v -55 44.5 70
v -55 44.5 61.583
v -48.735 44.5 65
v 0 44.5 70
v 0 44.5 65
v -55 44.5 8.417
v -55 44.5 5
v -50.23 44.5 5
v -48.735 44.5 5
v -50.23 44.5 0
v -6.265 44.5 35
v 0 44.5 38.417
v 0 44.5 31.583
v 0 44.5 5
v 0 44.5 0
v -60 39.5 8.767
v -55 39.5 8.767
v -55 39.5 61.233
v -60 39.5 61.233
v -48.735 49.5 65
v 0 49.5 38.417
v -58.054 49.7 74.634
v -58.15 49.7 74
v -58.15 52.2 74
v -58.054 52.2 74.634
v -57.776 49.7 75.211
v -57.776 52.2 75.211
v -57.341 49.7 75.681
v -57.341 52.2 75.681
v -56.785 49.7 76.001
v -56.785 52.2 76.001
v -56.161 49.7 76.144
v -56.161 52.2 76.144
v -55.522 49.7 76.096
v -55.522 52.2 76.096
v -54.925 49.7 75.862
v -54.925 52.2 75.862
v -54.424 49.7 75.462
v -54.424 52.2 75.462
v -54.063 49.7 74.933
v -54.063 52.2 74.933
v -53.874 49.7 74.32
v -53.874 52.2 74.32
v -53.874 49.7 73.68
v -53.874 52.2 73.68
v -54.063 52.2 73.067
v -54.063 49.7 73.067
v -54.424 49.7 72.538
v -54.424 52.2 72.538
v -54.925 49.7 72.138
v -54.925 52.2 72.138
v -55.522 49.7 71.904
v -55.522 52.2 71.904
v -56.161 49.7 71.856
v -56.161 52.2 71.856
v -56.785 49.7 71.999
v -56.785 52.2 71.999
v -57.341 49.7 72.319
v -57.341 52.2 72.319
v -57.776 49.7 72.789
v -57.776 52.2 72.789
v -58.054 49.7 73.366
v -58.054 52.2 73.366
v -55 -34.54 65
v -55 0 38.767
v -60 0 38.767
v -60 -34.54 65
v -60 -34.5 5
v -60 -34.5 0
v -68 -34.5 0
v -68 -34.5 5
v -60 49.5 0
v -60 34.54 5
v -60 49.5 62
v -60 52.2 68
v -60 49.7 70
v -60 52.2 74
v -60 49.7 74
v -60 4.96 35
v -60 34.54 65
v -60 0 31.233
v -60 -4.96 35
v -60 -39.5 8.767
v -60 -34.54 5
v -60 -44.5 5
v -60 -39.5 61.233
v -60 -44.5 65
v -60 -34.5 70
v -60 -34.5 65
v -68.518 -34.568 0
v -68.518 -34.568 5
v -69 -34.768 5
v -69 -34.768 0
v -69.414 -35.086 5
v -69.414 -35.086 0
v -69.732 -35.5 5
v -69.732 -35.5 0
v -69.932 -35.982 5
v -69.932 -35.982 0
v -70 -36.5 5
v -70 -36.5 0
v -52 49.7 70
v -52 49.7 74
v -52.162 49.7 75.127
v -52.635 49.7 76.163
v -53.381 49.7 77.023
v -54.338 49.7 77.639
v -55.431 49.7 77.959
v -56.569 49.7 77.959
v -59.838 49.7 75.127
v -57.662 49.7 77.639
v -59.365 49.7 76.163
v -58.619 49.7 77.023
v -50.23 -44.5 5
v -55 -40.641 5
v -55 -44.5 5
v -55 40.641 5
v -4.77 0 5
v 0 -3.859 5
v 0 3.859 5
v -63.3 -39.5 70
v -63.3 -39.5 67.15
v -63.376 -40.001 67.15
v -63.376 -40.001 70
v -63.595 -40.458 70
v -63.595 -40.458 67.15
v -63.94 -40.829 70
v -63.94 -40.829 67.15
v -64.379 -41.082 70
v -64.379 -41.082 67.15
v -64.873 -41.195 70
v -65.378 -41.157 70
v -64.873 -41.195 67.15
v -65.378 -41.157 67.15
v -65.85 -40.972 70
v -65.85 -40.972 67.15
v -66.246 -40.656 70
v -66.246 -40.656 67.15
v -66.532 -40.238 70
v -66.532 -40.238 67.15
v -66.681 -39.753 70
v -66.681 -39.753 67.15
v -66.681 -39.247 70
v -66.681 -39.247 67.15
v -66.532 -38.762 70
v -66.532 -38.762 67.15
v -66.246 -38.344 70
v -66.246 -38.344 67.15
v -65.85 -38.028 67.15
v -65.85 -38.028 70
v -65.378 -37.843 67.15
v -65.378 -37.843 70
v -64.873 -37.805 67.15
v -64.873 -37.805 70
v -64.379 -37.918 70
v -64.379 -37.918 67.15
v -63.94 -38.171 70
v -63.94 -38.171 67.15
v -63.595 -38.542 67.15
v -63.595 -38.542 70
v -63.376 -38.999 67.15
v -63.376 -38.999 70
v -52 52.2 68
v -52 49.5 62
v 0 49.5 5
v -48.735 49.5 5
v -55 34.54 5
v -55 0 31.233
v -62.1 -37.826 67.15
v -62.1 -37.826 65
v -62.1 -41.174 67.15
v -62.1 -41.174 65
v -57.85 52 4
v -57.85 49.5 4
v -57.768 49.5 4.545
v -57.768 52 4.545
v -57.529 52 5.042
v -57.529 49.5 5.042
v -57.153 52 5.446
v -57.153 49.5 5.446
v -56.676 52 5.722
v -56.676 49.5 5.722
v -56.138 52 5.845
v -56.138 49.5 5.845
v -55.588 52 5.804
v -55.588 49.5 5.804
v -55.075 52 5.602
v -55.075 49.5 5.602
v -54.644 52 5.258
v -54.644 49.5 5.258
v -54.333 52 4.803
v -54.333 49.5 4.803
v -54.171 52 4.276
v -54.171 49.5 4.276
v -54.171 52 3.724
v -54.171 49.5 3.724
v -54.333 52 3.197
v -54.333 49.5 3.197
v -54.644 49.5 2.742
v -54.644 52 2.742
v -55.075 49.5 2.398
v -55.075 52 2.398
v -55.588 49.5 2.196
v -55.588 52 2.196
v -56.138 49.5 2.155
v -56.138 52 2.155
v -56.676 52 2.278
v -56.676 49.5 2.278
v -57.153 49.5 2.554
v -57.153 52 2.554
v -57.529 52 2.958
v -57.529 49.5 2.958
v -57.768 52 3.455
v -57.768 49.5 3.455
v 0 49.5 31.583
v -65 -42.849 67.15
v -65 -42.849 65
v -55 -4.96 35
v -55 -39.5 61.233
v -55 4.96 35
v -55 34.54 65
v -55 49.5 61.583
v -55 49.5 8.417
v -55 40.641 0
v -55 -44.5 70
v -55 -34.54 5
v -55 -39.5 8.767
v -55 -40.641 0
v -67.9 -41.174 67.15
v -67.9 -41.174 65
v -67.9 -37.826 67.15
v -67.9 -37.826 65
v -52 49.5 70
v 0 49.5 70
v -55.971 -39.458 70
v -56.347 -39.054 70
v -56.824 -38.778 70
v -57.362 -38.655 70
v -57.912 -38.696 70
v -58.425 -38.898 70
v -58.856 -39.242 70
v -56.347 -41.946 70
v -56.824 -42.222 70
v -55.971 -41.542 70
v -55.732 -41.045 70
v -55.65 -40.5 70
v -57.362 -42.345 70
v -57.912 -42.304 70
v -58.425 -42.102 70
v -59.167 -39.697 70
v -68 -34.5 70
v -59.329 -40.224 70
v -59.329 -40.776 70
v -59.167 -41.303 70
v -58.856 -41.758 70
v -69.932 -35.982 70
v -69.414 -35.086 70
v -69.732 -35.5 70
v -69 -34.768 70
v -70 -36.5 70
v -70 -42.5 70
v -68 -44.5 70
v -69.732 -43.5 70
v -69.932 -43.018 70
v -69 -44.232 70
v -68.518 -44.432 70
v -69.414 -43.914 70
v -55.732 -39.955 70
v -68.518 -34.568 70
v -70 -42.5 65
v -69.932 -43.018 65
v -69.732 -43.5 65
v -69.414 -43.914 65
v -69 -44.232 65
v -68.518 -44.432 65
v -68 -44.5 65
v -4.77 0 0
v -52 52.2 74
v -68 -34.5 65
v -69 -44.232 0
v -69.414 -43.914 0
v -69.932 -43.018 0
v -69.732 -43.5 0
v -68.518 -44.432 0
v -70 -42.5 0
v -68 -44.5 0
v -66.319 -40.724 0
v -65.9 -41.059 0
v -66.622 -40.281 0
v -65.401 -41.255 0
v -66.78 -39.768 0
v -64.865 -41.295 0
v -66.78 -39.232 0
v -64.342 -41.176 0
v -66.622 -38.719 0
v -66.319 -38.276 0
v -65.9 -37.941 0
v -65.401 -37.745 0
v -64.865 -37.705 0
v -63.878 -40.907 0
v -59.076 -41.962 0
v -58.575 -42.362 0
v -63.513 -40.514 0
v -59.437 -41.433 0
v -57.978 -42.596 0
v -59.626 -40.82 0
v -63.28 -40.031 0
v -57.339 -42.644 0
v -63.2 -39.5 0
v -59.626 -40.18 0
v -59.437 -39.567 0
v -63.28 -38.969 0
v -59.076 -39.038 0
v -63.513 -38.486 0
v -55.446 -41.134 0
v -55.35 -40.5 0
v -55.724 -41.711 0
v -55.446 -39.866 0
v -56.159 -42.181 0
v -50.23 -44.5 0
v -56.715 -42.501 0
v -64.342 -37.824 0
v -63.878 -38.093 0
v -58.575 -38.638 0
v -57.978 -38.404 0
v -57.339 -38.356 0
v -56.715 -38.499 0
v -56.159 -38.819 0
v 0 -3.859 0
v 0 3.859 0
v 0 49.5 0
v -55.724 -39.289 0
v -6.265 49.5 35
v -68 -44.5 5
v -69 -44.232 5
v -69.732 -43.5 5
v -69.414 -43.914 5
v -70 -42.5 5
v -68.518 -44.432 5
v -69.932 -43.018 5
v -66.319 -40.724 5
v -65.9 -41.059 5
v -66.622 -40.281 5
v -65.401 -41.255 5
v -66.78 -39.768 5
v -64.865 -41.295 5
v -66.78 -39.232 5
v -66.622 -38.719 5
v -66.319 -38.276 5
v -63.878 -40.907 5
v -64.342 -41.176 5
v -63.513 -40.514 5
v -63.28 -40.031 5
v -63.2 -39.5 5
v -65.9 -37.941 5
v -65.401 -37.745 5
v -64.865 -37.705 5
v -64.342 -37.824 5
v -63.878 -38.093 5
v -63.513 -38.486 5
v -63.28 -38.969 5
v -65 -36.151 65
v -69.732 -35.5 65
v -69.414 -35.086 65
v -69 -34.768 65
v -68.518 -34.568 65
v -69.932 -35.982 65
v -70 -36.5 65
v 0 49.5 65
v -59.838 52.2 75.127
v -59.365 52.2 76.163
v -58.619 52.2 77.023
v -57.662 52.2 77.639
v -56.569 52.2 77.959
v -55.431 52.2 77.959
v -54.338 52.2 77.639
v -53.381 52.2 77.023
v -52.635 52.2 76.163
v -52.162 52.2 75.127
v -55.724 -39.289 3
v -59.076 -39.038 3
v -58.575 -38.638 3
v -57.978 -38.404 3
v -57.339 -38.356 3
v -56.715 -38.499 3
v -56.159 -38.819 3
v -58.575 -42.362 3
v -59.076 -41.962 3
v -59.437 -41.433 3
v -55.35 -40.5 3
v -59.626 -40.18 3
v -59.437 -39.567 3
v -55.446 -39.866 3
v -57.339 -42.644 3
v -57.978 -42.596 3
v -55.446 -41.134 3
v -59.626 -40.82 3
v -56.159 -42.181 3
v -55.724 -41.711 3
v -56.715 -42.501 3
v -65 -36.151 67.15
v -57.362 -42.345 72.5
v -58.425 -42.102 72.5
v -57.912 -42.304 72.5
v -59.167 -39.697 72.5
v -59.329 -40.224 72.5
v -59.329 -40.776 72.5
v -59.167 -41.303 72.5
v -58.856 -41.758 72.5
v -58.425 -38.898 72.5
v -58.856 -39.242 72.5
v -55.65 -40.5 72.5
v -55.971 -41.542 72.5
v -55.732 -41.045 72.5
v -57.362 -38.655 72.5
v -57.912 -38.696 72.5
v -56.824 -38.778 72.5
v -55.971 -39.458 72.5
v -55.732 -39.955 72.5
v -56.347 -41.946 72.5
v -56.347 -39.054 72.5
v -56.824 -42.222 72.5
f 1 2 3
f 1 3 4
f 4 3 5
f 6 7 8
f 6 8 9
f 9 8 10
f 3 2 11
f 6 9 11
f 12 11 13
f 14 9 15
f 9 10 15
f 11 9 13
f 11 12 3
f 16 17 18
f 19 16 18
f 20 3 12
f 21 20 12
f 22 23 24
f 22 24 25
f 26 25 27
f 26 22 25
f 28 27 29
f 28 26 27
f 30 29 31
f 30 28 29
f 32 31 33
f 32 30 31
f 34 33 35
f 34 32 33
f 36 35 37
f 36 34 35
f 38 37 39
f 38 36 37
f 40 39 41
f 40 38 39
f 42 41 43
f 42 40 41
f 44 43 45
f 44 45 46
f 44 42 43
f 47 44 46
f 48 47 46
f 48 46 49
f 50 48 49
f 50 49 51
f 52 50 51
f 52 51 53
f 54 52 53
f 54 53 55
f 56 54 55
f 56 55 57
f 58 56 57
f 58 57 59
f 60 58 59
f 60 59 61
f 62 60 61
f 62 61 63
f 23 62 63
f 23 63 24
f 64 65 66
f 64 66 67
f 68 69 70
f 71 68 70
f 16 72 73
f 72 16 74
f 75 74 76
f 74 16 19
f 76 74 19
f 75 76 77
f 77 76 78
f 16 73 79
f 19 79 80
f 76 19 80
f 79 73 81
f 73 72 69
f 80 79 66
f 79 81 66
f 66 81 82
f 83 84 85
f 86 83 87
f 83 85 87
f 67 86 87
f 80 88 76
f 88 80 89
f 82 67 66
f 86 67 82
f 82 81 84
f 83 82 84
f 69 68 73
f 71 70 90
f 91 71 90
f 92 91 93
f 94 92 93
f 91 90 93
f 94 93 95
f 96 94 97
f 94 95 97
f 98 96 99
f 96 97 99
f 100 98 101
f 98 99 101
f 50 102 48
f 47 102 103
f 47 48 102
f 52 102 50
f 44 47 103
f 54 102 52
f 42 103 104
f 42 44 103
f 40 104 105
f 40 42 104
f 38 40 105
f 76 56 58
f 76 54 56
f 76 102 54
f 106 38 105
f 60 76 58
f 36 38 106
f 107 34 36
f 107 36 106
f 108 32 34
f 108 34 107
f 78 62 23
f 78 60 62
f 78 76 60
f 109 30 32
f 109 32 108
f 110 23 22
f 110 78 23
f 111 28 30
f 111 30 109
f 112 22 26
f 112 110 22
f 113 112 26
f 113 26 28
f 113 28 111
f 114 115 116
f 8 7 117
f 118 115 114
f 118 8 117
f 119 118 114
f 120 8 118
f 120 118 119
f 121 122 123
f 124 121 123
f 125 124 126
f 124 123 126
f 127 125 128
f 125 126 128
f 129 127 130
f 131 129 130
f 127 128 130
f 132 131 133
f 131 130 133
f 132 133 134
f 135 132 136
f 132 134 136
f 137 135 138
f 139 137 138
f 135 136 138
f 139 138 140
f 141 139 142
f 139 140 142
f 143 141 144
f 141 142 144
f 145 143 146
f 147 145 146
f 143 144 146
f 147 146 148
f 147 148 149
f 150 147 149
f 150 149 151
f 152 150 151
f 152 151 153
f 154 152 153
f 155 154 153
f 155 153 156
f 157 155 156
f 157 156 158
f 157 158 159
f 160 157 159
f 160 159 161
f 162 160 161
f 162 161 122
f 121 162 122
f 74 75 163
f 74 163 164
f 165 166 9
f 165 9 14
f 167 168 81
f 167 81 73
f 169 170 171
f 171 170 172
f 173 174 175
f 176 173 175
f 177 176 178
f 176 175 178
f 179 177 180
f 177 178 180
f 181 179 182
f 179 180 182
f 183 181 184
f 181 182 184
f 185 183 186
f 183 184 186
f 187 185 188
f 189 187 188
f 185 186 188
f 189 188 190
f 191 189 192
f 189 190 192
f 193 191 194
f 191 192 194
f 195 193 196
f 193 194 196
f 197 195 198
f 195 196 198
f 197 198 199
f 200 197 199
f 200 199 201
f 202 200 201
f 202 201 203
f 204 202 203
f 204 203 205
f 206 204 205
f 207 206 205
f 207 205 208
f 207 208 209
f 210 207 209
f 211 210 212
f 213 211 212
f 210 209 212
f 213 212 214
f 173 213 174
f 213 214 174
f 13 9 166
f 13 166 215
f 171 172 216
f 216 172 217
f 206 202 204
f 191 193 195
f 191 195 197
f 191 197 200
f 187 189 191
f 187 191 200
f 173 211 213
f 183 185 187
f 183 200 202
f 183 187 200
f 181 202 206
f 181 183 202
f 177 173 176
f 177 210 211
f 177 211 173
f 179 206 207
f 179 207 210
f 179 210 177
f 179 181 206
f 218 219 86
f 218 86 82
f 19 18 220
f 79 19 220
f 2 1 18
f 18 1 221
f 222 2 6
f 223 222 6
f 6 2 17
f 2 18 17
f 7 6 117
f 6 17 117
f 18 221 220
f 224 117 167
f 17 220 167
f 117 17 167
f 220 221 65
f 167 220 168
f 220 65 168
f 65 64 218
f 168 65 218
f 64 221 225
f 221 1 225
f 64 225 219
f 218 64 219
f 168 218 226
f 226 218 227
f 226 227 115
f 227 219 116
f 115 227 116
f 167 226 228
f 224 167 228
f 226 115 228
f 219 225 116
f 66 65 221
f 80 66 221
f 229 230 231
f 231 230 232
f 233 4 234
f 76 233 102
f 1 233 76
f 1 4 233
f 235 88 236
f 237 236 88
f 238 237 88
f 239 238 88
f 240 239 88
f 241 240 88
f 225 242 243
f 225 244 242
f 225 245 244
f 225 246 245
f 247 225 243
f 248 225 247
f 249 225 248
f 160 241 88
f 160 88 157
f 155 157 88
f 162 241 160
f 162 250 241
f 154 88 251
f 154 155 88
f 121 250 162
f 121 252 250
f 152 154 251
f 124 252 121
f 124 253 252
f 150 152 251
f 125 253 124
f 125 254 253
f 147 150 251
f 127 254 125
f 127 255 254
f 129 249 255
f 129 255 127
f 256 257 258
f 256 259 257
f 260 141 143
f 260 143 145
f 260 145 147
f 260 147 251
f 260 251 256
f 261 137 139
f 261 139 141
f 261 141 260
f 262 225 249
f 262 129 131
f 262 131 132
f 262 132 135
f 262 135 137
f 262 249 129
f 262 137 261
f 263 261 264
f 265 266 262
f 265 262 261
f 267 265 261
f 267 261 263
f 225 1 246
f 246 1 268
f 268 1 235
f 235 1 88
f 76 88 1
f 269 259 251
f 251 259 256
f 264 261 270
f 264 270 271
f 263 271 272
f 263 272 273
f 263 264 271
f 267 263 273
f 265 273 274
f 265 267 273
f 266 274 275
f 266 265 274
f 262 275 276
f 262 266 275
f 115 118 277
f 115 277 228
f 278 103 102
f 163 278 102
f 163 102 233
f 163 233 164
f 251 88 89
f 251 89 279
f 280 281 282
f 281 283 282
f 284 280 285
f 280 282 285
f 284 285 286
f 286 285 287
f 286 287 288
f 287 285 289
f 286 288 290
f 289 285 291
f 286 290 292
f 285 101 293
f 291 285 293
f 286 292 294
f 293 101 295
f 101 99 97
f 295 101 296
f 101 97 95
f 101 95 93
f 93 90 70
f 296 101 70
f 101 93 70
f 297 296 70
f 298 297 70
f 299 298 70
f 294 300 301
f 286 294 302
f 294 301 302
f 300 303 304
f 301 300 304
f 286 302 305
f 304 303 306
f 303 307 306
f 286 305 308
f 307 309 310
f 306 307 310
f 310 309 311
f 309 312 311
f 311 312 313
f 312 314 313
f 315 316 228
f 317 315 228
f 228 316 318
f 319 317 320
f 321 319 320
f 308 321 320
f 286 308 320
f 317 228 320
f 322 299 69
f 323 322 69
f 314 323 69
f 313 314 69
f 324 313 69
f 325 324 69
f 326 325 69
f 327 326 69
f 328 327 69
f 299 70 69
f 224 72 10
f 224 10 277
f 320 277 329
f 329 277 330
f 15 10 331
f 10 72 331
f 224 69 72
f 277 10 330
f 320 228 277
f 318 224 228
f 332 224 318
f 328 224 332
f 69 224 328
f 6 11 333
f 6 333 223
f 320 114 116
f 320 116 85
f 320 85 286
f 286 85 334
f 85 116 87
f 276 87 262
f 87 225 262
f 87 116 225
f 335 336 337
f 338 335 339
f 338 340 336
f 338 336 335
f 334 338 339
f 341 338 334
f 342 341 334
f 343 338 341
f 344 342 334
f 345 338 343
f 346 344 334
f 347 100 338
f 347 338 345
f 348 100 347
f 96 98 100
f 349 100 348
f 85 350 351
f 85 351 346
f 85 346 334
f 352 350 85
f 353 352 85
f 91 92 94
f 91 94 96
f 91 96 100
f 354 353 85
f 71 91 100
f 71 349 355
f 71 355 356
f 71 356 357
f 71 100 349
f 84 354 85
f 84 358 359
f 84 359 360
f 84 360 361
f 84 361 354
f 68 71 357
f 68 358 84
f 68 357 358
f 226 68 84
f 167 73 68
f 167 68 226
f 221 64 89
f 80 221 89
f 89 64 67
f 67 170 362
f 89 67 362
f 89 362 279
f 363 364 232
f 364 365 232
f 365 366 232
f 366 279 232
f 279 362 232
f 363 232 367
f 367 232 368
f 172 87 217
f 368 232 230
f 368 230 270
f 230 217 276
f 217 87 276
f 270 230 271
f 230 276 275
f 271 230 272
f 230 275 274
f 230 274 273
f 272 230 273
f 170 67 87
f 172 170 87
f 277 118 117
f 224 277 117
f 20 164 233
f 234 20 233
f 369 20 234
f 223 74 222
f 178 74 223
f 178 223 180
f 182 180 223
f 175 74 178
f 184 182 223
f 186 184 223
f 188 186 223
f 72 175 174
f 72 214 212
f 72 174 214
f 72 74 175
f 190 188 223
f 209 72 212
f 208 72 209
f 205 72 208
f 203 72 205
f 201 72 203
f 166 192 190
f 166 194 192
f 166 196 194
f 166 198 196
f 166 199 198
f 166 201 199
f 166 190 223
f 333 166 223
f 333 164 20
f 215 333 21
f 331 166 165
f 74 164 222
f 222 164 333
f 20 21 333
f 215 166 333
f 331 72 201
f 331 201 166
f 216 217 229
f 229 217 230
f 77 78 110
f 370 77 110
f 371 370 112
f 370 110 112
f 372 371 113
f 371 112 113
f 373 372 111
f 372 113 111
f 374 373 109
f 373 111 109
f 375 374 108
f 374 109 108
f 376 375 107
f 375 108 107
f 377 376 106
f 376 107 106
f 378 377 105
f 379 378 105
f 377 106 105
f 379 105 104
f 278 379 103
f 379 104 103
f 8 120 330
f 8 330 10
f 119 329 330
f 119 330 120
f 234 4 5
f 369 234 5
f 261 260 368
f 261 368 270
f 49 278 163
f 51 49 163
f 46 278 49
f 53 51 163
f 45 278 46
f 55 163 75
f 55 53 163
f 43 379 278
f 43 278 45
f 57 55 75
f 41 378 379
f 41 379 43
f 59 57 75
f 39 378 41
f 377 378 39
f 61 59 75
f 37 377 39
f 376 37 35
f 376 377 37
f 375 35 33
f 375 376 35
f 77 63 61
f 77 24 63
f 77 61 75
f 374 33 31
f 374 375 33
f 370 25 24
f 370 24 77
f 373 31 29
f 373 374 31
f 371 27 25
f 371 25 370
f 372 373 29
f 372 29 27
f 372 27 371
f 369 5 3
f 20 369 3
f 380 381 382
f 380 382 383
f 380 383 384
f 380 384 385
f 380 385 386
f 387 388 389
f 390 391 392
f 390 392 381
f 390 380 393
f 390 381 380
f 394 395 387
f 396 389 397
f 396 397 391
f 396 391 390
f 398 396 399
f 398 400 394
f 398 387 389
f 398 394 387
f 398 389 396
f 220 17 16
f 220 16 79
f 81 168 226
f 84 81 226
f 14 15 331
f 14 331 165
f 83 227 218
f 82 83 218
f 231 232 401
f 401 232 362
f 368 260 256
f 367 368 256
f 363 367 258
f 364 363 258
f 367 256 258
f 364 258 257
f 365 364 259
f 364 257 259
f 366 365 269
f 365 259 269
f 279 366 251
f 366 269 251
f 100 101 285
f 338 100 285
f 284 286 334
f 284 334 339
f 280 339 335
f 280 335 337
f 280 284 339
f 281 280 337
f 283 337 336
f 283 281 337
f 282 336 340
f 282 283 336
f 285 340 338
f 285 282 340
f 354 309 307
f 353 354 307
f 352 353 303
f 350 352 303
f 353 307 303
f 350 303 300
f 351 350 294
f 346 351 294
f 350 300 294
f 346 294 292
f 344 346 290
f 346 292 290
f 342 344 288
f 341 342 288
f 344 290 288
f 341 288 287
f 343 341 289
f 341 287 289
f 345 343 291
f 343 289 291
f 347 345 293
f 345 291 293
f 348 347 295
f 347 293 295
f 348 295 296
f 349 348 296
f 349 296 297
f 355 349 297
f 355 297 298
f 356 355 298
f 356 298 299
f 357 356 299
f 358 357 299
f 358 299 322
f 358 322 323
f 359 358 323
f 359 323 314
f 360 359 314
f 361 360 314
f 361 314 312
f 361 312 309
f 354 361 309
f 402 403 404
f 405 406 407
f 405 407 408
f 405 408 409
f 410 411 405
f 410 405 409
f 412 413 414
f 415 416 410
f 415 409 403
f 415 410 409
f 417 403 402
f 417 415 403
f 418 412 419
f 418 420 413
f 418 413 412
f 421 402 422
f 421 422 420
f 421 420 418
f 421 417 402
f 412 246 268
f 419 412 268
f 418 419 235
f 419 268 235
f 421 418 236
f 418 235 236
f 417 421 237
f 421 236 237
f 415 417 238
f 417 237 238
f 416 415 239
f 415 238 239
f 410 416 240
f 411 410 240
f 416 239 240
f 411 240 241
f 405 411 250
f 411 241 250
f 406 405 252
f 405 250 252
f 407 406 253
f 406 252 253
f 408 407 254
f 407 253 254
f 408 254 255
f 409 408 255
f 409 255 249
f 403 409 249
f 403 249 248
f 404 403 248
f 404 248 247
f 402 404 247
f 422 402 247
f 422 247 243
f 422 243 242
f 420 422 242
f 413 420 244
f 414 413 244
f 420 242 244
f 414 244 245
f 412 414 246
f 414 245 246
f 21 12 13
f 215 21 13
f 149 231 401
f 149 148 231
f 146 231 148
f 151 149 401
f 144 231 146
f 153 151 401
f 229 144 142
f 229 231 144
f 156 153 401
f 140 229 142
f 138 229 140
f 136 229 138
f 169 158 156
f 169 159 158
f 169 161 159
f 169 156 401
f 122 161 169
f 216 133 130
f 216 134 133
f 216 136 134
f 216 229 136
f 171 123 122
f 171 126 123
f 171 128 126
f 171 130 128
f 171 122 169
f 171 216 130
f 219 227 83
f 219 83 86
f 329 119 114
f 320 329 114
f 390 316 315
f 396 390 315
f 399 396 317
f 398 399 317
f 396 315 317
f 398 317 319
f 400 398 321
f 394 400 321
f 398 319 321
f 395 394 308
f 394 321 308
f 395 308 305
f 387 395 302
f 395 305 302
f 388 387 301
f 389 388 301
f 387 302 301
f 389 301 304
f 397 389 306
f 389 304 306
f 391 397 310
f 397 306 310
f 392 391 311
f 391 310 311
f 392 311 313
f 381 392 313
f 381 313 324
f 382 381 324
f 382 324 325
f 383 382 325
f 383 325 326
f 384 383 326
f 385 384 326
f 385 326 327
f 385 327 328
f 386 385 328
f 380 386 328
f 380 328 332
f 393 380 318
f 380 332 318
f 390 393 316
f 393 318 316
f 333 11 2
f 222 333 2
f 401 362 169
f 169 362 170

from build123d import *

# Parameters (mm, degrees)
SKETCH_W                   = 55
SKETCH_H                   = 44.5
PAD_DEPTH                  = 5
PAD001_DEPTH               = 5
PAD001_MIRRORED001_2_DEPTH = 5
PAD002_DEPTH               = 5
SKETCH003_R                = 1.85
PAD003_DEPTH               = 2.5
SKETCH004_R                = 2.15
PAD004_DEPTH               = 2.7
SKETCH005_W                = 0.2
SKETCH005_H                = 8
POCKET_DEPTH               = 60.001
SKETCH006_R                = 1.85
PAD005_DEPTH               = 2.5
SKETCH007_R                = 2.15
POCKET001_DEPTH            = 3
PAD006_DEPTH               = 5
SKETCH009_R                = 1.8
HOLE_DEPTH                 = 25
HOLE_TIPS_R                = 1.8
PAD007_DEPTH               = 5
POCKET002_DEPTH            = 2.15
SKETCH012_R                = 1.7
HOLE001_DEPTH              = 10.851
POCKET003_DEPTH            = 290.201912


with BuildPart() as part:
    # Sketch → Pad (new body)
    with BuildSketch(Plane.XY):
        with Locations((-27.5, -22.25)):
            Rectangle(SKETCH_W, SKETCH_H)
    pad = extrude(amount=PAD_DEPTH)

    # Mirrored: Pad across XZ
    add(pad.mirror(Plane.XZ))

    # Sketch001 (on Face1 of Mirrored) → Pad001 (join)
    with BuildSketch(Plane(origin=(-55, 0, 0), x_dir=(0, -1, 0), z_dir=(-1, 0, 0))):
        Polygon((0, 0), (44.5, 0), (44.5, 35), (39.5, 35), (39.5, 8.767158), (4.960091, 35), (0, 35), (0, 31.232842), (34.539909, 5), (0, 5), align=None)
    pad001 = extrude(amount=PAD001_DEPTH)

    # Sketch001 Mirrored001 2 → Pad001 Mirrored001 2 (add)
    with BuildSketch(Plane.YZ.offset(-55)):
        Polygon((0, 0), (44.5, 0), (44.5, 35), (39.5, 35), (39.5, 8.767158), (4.960091, 35), (0, 35), (0, 31.232842), (34.539909, 5), (0, 5), align=None)
    pad001_mirrored001_2 = extrude(amount=-PAD001_MIRRORED001_2_DEPTH)

    # Mirrored002: Pad001, Pad001 Mirrored001 2 across face of Pad001
    add(pad001.mirror(Plane(origin=(-57.5, -2.480045, 35), x_dir=(1, 0, 0), z_dir=(0, 0, 1))))
    add(pad001_mirrored001_2.mirror(Plane(origin=(-57.5, -2.480045, 35), x_dir=(1, 0, 0), z_dir=(0, 0, 1))))

    # Sketch002 (on Face1 of MultiTransform) → Pad002 (join)
    with BuildSketch(Plane(origin=(0, 44.5, 0), x_dir=(-1, 0, 0), z_dir=(0, 1, 0))):
        Polygon((6.264982, 35), (55, 8.417263), (55, 35), (60, 35), (60, 0), (0, 0), (0, 5), (48.735018, 5), (0, 31.582737), (0, 35), align=None)
    pad002 = extrude(amount=PAD002_DEPTH)

    # Mirrored003: Pad002 across face of Pad002
    add(pad002.mirror(Plane(origin=(-3.132491, 47, 35), x_dir=(1, 0, 0), z_dir=(0, 0, 1))))

    # Sketch003 (on Face8 of Mirrored003) → Pad003 (join)
    with BuildSketch(Plane(origin=(0, 49.5, 0), x_dir=(-1, 0, 0), z_dir=(0, 1, 0))):
        with Locations((56, 4)):
            Circle(SKETCH003_R)
    extrude(amount=PAD003_DEPTH)

    # Sketch004 (on Face19 of Pad003) → Pad004 (join)
    with BuildSketch(Plane(origin=(0, 49.5, 0), x_dir=(-1, 0, 0), z_dir=(0, 1, 0))):
        with BuildLine():
            Line((60, 62), (60, 74))
            ThreePointArc((60, 74), (56, 78), (52, 74))
            Line((52, 74), (52, 62))
            Line((52, 62), (60, 62))
        make_face()
        with Locations((56, 74)):
            Circle(SKETCH004_R, mode=Mode.SUBTRACT)
    extrude(amount=PAD004_DEPTH)

    # Sketch005 (on Face56 of Pad004) → Pocket (cut, through all)
    with BuildSketch(Plane(origin=(-60, 0, 0), x_dir=(0, -1, 0), z_dir=(-1, 0, 0))):
        Polygon((-52.2, 68), (-49.5, 62), (-52.2, 62), align=None)
        with Locations((-49.6, 74)):
            Rectangle(SKETCH005_W, SKETCH005_H)
    extrude(amount=-POCKET_DEPTH, mode=Mode.SUBTRACT)

    # Sketch006 (on Face59 of Pocket) → Pad005 (join)
    with BuildSketch(Plane.XY.offset(70)):
        with Locations((-57.5, -40.5)):
            Circle(SKETCH006_R)
    extrude(amount=PAD005_DEPTH)

    # Sketch007 (on Face24 of Pad005) → Pocket001 (cut)
    with BuildSketch(Plane(origin=(0, 0, 0), x_dir=(1, 0, 0), z_dir=(0, 0, -1))):
        with Locations((-57.5, 40.5)):
            Circle(SKETCH007_R)
    extrude(amount=-POCKET001_DEPTH, mode=Mode.SUBTRACT)

    # Sketch008 (on Face24 of Pocket001) → Pad006 (join)
    with BuildSketch(Plane(origin=(0, 0, 0), x_dir=(1, 0, 0), z_dir=(0, 0, -1))):
        with BuildLine():
            Line((-60, 44.5), (-68, 44.5))
            ThreePointArc((-68, 44.5), (-69.414214, 43.914214), (-70, 42.5))
            Line((-70, 42.5), (-70, 39.5))
            Line((-70, 39.5), (-60, 39.5))
            Line((-60, 39.5), (-60, 44.5))
        make_face()
    pad006 = extrude(amount=-PAD006_DEPTH)

    # Mirrored004: Pad006 across face of Pad006
    add(pad006.mirror(Plane(origin=(-65, -39.5, 2.5), x_dir=(-1, 0, 0), z_dir=(0, 1, 0))))

    # Sketch009 (on Face46 of Mirrored004) → Hole (cut)
    with BuildSketch(Plane(origin=(0, 0, 0), x_dir=(1, 0, 0), z_dir=(0, 0, -1))):
        with Locations((-65, 39.5)):
            Circle(SKETCH009_R)
    extrude(amount=-HOLE_DEPTH, mode=Mode.SUBTRACT)

    # Hole tips → Hole tip 1 section 0
    with BuildSketch(Plane(origin=(0, 0, 25), x_dir=(1, 0, 0), z_dir=(0, 0, -1)), mode=Mode.PRIVATE) as hole_tip_1_s0:
        with Locations((-65, 39.5)):
            Circle(HOLE_TIPS_R)
    loft([hole_tip_1_s0.sketch, Vertex(-65, -39.5, 26.081549)], mode=Mode.SUBTRACT)

    # Sketch010 (on Face65 of Hole) → Pad007 (join)
    with BuildSketch(Plane.XY.offset(70)):
        with BuildLine():
            Line((-60, -44.5), (-68, -44.5))
            ThreePointArc((-70, -42.5), (-69.414214, -43.914214), (-68, -44.5))
            Line((-70, -42.5), (-70, -39.5))
            Line((-70, -39.5), (-60, -39.5))
            Line((-60, -39.5), (-60, -44.5))
        make_face()
    pad007 = extrude(amount=-PAD007_DEPTH)

    # Mirrored005: Pad007 across face of Pad007
    add(pad007.mirror(Plane(origin=(-65, -39.5, 67.5), x_dir=(-1, 0, 0), z_dir=(0, 1, 0))))

    # Sketch011 (on Face89 of Mirrored005) → Pocket002 (cut)
    with BuildSketch(Plane(origin=(0, 0, 65), x_dir=(1, 0, 0), z_dir=(0, 0, -1))):
        Polygon((-65, 42.848632), (-67.9, 41.174316), (-67.9, 37.825684), (-65, 36.151368), (-62.1, 37.825684), (-62.1, 41.174316), align=None)
    extrude(amount=-POCKET002_DEPTH, mode=Mode.SUBTRACT)

    # Sketch012 (on Face102 of Pocket002) → Hole001 (cut, through all)
    with BuildSketch(Plane(origin=(0, 0, 67.15), x_dir=(1, 0, 0), z_dir=(0, 0, -1))):
        with Locations((-65, 39.5)):
            Circle(SKETCH012_R)
    extrude(amount=-HOLE001_DEPTH, mode=Mode.SUBTRACT)

    # Sketch013 (on Face11 of Hole001) → Pocket003 (cut, through all)
    with BuildSketch(Plane.XY.offset(5)):
        Polygon((0, -3.85897), (-50.230486, -44.5), (0, -44.5), align=None)
        Polygon((-55, 0), (-4.769514, 0), (-55, -40.64103), align=None)
    pocket003 = extrude(amount=-POCKET003_DEPTH, mode=Mode.SUBTRACT)

    # Mirrored006: Pocket003 across XZ
    add(pocket003.mirror(Plane.XZ), mode=Mode.SUBTRACT)


solid = part.part
